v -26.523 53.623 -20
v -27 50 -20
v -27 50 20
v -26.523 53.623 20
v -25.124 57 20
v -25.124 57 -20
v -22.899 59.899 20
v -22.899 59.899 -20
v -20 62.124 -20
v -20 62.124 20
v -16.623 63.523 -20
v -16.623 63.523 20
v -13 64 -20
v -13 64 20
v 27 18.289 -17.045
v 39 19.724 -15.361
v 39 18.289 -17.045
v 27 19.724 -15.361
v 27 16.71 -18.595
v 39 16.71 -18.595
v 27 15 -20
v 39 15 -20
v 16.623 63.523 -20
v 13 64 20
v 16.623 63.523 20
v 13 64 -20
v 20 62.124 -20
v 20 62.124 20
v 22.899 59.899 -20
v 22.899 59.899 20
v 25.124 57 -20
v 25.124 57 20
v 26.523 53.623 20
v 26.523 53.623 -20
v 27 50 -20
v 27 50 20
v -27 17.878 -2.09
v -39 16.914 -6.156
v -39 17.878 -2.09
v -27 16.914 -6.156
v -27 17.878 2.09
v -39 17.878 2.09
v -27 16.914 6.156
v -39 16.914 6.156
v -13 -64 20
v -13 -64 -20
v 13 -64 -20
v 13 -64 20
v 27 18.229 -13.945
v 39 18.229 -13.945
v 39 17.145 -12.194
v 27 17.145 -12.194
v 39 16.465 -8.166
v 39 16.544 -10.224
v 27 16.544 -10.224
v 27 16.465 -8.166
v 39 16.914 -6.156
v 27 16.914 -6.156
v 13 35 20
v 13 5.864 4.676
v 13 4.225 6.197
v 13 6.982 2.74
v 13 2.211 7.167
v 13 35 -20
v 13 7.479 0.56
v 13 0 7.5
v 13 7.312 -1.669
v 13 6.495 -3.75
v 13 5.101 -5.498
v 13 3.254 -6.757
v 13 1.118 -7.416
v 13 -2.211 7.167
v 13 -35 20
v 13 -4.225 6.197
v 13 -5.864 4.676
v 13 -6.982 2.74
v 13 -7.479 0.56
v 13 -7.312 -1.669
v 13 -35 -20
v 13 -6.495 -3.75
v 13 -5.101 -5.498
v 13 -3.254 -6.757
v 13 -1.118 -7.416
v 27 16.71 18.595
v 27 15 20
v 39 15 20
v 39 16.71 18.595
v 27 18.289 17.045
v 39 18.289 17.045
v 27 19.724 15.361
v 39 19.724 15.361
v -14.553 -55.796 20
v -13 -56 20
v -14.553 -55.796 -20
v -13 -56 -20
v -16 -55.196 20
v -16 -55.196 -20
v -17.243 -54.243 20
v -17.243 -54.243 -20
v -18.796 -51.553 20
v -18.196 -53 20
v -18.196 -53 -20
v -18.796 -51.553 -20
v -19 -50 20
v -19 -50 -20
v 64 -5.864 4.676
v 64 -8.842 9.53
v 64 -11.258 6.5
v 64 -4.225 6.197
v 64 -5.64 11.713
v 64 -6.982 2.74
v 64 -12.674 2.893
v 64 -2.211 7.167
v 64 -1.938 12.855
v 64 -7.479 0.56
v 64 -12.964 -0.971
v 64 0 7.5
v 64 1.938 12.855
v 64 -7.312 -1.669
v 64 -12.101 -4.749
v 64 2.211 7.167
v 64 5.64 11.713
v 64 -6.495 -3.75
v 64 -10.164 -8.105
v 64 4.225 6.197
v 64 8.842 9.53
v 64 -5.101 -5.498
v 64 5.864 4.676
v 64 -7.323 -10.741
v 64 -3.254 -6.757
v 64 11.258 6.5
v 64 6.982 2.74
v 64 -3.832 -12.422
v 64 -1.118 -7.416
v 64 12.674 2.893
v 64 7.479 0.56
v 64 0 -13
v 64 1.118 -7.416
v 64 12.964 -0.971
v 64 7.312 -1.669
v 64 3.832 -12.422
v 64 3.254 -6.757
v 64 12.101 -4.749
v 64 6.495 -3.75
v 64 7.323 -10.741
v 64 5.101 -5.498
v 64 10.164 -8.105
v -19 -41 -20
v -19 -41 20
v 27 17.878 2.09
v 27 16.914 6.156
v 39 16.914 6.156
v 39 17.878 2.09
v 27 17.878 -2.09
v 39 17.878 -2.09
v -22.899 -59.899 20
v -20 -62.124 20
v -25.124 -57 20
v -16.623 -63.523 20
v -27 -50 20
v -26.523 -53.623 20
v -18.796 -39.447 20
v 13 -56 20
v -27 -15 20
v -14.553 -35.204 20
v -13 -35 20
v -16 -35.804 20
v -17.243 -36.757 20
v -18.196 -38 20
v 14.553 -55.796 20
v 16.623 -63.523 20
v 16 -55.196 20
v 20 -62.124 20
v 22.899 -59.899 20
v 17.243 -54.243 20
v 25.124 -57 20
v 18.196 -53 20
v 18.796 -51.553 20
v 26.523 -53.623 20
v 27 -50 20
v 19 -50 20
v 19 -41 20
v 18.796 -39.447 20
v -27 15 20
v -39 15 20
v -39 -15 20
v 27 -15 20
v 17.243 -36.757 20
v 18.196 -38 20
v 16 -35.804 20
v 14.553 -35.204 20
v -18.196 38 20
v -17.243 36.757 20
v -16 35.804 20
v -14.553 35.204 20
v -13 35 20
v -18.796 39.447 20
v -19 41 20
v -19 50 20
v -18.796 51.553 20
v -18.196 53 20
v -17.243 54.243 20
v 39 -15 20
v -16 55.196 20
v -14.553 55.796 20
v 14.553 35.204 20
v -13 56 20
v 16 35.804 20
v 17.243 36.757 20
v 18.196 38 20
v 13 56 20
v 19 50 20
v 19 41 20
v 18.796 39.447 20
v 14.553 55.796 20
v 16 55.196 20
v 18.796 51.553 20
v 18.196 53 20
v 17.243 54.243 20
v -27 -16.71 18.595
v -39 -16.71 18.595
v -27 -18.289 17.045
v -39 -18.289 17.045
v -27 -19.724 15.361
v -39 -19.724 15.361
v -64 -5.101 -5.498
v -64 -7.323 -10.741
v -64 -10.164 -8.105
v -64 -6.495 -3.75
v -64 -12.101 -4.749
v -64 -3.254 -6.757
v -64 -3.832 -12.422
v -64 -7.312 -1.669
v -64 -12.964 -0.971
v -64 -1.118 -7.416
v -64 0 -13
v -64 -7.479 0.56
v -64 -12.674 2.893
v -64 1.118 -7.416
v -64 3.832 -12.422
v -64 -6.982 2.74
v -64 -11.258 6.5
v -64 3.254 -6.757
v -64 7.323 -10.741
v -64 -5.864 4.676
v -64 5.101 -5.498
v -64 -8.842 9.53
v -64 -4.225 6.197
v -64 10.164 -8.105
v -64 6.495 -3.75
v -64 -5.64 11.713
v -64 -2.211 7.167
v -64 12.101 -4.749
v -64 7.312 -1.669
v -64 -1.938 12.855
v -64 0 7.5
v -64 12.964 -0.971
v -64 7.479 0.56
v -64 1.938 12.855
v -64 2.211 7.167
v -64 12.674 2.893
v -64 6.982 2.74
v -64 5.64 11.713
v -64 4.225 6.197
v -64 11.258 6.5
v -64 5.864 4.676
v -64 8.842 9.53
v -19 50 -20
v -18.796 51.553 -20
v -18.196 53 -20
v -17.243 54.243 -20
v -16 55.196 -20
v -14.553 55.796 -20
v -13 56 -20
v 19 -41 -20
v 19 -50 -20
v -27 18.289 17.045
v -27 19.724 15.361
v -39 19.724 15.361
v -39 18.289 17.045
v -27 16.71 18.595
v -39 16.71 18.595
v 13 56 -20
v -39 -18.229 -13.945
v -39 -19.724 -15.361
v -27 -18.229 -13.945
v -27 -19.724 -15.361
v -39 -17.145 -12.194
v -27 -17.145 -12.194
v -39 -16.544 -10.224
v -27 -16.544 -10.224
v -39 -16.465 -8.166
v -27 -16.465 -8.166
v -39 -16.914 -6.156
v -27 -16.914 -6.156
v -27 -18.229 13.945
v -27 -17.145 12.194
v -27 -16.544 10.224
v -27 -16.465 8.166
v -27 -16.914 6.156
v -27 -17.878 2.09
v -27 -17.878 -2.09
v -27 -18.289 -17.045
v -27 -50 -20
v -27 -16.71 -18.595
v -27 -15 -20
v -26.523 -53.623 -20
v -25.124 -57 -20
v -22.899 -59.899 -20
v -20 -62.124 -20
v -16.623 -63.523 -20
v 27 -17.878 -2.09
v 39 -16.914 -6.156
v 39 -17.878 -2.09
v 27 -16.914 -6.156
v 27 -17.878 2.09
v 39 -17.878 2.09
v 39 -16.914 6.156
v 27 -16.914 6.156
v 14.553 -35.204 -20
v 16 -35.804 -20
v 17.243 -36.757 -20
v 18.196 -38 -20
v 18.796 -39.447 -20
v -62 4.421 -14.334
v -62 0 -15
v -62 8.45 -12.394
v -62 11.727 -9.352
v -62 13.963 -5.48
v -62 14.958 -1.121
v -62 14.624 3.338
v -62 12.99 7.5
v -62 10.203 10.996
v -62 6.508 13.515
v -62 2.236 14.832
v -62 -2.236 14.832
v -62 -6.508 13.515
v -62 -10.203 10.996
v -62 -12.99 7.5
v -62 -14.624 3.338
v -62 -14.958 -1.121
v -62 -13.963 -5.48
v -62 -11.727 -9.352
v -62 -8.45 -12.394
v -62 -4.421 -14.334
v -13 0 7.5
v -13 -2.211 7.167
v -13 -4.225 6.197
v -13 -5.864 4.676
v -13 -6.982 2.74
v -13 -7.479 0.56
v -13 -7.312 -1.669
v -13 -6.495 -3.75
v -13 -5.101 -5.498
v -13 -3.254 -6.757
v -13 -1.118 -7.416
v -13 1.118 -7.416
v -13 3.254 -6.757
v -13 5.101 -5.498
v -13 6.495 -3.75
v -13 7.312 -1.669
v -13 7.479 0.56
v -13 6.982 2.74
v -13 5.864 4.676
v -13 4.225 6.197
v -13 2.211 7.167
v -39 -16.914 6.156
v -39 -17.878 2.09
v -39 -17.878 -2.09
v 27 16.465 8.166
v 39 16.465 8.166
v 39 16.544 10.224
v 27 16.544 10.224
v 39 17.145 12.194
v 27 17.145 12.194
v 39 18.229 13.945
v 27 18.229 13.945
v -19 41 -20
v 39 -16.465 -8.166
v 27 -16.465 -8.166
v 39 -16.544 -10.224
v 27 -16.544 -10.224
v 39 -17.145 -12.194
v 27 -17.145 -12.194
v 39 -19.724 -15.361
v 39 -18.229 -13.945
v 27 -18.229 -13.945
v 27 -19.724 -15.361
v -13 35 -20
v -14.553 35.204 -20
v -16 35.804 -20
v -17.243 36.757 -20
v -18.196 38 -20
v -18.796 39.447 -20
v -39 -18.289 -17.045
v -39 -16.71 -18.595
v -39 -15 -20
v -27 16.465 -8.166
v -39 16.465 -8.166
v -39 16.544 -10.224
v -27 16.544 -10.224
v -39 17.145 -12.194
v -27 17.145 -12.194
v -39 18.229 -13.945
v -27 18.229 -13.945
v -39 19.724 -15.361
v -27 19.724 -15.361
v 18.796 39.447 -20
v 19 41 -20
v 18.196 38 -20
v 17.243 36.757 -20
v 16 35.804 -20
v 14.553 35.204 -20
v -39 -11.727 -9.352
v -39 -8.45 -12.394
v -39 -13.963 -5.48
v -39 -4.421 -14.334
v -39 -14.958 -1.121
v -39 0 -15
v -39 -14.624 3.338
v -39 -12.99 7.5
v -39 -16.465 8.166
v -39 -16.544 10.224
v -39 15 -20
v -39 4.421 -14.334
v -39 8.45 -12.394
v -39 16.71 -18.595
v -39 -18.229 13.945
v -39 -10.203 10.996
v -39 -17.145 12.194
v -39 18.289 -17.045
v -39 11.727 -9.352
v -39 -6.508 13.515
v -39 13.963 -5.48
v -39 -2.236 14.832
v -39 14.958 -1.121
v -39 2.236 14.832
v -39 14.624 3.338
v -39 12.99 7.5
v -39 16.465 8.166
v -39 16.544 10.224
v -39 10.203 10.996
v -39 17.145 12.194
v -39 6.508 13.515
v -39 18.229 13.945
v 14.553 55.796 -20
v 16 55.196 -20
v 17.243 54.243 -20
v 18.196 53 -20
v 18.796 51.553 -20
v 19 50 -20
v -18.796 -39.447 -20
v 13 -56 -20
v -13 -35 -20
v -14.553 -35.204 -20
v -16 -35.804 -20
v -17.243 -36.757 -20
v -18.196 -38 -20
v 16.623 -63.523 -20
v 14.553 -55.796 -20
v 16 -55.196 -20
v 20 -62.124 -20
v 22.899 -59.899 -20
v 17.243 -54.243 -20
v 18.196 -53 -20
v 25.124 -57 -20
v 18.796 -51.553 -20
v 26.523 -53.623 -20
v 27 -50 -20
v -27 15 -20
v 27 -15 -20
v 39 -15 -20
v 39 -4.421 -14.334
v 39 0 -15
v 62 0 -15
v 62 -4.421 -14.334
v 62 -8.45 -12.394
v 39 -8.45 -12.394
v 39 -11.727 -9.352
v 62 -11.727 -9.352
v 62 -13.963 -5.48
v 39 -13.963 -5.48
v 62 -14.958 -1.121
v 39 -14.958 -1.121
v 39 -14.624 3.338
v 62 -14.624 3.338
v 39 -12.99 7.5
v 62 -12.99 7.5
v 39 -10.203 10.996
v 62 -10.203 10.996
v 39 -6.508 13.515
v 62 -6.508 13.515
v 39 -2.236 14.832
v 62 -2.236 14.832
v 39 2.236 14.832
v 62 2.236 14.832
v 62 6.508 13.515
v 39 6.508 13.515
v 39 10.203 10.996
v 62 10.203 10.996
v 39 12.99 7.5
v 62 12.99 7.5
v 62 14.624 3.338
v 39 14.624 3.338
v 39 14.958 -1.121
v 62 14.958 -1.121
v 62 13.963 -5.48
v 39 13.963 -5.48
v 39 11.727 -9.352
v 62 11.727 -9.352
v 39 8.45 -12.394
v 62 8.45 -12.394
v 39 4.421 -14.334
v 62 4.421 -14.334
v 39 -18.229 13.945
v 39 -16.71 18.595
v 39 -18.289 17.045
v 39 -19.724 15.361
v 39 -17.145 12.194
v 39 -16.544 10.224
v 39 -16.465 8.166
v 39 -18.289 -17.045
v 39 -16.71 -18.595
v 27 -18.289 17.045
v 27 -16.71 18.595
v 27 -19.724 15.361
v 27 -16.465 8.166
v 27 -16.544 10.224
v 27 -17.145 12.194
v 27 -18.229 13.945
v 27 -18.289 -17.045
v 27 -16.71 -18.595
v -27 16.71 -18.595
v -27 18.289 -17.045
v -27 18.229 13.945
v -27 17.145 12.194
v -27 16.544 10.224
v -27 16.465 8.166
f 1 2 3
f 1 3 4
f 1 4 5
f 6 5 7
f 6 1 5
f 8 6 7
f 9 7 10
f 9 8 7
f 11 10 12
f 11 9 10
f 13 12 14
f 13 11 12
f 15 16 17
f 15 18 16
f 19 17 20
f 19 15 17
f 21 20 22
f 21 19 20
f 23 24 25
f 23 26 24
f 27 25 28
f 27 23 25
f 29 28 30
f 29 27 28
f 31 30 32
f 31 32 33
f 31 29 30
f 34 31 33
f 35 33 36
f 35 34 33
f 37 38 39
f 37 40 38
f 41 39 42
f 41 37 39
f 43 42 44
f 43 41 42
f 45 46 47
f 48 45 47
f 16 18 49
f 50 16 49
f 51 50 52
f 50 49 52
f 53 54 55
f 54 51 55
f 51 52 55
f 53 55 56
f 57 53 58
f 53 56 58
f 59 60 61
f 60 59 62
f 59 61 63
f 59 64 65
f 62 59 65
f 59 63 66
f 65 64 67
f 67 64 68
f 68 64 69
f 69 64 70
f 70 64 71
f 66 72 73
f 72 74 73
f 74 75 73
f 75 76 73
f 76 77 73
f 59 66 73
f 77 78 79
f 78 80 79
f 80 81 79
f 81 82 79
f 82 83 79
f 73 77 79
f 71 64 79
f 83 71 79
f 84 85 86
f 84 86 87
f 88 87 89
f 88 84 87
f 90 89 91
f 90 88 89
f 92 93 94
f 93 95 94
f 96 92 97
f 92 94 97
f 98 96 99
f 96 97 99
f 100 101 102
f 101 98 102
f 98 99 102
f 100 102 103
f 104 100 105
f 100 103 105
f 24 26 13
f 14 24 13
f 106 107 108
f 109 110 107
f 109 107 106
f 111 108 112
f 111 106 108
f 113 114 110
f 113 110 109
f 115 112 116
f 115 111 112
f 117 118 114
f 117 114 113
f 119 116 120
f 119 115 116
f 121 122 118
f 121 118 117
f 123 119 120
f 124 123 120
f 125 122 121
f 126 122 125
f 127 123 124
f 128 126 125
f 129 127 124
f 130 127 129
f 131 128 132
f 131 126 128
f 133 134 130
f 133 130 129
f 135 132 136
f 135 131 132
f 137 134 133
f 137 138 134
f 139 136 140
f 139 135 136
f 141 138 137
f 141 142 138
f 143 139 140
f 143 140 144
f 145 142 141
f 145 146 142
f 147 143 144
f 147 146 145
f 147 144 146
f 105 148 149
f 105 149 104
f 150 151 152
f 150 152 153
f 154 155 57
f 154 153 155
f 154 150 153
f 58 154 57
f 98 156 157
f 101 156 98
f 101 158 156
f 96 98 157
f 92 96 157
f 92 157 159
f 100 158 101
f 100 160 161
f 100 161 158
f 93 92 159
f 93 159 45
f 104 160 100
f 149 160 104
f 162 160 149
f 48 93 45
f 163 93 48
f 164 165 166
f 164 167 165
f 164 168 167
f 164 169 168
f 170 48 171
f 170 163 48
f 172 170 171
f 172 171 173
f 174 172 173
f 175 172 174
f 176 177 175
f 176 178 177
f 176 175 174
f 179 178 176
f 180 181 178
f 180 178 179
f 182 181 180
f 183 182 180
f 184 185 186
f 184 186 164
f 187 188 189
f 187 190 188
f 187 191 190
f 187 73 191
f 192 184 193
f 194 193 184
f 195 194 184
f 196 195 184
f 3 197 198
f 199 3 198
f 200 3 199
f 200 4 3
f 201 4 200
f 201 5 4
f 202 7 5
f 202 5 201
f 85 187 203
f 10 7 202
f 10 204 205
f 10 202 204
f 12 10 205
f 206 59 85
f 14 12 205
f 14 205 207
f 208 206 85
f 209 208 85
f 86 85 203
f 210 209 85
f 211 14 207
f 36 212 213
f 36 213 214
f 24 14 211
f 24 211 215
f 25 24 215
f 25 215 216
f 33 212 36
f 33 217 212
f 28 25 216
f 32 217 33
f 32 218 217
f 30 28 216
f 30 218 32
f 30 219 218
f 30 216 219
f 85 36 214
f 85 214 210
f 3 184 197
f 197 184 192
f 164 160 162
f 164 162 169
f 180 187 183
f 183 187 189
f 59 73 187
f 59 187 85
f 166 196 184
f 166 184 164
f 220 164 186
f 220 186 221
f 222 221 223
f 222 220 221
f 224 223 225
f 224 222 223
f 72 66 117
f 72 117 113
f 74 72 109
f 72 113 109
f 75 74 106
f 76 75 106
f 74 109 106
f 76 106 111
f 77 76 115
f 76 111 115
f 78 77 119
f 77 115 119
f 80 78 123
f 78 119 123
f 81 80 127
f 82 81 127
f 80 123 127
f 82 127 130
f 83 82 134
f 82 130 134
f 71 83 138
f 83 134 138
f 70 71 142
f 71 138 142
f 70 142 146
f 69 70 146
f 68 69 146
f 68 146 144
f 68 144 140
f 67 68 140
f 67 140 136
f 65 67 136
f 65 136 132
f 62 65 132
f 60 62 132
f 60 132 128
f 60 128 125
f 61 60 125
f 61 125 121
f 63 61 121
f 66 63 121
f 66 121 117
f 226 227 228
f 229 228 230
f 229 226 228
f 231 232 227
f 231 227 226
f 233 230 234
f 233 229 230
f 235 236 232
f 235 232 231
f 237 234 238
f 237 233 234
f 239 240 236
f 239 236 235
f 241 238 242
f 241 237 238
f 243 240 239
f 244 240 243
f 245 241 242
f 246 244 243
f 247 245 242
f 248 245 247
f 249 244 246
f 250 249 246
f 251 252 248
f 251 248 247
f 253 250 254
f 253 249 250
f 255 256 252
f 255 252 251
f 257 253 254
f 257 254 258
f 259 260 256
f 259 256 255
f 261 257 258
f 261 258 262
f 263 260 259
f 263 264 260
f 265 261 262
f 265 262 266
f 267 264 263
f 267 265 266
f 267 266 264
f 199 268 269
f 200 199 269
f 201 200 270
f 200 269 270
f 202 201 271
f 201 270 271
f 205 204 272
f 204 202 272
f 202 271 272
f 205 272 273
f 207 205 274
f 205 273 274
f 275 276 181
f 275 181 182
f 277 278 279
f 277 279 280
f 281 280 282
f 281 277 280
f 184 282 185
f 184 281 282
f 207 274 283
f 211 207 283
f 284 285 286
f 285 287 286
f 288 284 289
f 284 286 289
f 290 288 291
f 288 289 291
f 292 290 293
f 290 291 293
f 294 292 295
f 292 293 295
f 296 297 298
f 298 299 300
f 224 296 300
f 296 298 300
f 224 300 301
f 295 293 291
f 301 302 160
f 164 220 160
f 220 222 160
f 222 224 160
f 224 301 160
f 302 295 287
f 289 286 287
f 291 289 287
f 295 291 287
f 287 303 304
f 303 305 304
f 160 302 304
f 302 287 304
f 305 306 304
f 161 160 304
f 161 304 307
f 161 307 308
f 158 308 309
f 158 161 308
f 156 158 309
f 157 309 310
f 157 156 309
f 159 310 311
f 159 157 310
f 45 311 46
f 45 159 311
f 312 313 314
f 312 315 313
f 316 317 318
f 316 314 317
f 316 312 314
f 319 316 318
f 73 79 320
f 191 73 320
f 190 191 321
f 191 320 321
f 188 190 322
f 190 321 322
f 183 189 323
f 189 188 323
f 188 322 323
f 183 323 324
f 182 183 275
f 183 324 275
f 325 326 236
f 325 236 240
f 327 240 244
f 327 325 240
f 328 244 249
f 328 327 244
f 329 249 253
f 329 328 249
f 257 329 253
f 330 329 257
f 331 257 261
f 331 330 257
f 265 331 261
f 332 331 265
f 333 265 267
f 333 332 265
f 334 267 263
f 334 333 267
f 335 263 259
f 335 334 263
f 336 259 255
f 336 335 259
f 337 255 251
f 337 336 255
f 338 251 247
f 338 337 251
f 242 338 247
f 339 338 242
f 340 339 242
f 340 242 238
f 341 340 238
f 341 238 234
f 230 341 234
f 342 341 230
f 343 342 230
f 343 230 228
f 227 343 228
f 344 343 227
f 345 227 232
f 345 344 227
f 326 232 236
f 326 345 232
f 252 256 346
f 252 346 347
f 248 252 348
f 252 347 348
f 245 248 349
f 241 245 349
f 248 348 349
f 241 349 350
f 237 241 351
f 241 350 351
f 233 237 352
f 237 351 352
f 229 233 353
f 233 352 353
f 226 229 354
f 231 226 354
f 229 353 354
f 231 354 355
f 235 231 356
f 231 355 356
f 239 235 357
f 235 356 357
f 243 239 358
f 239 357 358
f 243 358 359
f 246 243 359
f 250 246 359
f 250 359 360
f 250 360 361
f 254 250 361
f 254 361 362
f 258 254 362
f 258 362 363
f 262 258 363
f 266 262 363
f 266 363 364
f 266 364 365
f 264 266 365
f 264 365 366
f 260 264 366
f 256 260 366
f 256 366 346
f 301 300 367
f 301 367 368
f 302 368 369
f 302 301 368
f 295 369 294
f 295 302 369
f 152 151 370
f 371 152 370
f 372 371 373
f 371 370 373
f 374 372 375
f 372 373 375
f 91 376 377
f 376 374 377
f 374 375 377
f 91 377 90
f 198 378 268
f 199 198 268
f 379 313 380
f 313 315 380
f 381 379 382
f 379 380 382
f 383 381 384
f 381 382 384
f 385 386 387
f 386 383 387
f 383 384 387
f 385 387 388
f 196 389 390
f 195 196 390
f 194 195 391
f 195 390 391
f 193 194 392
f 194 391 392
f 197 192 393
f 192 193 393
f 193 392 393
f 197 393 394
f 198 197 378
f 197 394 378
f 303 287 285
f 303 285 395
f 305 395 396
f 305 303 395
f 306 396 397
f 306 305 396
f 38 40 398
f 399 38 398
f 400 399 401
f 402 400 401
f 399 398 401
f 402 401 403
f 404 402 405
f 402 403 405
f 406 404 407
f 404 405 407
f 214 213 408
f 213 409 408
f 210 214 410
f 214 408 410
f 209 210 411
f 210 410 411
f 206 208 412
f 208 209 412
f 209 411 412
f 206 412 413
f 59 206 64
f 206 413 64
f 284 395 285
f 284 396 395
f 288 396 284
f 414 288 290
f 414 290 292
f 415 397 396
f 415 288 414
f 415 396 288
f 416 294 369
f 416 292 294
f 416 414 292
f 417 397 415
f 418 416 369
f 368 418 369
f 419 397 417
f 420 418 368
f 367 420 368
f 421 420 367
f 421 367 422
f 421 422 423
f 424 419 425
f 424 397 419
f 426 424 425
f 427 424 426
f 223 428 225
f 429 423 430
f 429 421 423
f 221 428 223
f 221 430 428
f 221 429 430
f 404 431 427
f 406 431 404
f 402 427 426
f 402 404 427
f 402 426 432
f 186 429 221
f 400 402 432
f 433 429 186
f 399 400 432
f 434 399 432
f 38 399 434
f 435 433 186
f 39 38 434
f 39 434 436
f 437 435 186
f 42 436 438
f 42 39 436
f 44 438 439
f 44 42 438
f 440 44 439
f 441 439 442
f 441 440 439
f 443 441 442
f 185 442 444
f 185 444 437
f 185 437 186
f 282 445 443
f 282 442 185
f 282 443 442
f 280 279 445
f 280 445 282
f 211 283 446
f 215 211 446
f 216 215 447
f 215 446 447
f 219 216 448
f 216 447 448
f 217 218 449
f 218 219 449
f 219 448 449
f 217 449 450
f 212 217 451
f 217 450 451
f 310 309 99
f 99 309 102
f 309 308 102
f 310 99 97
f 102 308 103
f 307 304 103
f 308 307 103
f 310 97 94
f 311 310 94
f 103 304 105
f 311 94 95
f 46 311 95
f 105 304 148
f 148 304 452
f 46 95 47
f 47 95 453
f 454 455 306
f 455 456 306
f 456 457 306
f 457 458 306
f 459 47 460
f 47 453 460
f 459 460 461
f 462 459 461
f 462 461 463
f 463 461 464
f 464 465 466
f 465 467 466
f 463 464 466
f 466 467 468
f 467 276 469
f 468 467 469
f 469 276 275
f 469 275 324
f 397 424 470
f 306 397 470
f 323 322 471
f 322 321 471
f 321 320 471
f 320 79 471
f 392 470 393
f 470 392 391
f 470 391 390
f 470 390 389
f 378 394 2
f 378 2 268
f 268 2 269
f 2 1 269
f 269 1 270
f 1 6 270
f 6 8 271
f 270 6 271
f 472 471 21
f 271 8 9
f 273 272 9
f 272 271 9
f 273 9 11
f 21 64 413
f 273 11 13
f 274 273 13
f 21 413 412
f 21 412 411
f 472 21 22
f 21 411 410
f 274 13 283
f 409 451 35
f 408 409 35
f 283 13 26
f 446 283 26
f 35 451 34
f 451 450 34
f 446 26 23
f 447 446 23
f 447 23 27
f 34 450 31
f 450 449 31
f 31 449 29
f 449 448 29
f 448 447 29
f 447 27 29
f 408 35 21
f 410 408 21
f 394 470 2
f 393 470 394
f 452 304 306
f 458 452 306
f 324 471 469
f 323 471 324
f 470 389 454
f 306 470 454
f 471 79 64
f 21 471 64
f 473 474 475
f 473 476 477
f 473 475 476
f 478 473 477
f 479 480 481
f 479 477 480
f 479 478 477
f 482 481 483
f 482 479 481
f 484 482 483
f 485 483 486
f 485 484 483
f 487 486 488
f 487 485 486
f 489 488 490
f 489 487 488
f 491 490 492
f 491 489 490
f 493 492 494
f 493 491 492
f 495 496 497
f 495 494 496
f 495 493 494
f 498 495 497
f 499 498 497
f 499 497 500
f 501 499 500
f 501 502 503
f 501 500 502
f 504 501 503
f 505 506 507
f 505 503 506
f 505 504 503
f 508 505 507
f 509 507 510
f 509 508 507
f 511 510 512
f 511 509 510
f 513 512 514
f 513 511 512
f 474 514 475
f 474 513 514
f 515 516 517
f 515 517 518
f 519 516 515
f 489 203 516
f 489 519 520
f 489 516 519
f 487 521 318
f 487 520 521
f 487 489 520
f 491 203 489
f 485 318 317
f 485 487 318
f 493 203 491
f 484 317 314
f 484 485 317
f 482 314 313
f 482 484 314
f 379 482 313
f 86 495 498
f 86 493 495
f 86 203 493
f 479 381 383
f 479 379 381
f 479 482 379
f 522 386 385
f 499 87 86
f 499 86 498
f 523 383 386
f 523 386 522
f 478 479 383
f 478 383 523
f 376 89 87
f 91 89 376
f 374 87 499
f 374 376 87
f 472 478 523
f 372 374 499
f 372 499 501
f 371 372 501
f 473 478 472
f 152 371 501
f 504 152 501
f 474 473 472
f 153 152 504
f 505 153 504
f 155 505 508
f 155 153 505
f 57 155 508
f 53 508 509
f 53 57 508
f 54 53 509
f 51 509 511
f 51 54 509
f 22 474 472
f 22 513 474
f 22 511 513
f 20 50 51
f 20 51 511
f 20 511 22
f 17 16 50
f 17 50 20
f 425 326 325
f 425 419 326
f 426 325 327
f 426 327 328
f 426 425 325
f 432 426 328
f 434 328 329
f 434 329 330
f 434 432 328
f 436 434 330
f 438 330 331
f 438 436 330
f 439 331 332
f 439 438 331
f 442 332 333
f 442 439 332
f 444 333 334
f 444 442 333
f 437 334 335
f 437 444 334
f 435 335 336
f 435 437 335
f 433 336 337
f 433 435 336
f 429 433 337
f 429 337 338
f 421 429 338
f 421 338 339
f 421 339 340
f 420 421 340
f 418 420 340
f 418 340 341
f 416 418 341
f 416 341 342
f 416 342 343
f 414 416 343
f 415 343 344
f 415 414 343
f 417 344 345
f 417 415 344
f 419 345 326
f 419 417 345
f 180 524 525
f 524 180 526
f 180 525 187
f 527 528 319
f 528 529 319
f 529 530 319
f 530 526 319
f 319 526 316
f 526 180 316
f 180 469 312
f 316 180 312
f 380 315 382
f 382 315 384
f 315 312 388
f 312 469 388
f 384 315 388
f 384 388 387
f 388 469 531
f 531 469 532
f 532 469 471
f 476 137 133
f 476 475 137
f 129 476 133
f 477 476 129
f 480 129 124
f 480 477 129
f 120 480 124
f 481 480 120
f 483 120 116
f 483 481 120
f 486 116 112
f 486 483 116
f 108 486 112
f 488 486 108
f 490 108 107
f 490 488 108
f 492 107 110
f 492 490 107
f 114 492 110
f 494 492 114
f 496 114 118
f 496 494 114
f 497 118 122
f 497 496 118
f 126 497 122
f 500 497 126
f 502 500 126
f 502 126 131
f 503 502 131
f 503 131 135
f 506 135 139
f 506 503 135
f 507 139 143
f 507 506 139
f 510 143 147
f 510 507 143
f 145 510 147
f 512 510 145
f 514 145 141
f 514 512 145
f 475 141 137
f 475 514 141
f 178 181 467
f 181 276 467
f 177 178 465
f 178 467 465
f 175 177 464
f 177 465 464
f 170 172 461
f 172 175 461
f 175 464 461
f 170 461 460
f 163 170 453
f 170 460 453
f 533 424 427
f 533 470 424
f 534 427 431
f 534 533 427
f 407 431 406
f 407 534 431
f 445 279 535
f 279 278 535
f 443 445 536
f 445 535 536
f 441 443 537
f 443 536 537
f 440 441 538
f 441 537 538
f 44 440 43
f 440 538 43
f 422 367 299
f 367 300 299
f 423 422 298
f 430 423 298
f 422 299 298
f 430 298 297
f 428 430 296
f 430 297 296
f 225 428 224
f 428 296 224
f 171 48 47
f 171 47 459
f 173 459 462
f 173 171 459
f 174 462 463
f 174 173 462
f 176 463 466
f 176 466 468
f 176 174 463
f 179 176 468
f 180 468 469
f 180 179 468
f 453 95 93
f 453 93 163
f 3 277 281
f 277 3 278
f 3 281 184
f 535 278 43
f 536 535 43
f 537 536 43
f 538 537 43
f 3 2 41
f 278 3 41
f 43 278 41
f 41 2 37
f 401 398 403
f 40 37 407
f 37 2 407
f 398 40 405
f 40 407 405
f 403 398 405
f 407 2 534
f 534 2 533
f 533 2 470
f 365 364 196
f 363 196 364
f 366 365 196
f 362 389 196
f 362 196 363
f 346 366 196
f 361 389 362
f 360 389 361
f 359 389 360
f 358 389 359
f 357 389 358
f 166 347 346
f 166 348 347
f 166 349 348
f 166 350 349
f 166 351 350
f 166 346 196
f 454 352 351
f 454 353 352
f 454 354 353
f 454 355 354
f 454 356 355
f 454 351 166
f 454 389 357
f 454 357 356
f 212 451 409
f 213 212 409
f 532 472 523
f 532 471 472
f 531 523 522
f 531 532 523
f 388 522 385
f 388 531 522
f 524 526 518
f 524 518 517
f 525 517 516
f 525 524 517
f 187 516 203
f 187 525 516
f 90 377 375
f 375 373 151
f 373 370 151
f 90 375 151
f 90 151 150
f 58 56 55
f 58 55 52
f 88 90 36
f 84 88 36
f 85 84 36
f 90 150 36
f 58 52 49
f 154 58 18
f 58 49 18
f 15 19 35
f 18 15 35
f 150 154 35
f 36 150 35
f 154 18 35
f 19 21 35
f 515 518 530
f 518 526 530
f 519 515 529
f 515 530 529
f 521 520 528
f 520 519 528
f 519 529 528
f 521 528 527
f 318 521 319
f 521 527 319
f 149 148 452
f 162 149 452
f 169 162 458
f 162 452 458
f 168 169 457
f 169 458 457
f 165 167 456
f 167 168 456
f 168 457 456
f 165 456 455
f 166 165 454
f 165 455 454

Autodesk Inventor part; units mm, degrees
ref_plane "YZ Plane" through (0, 0, 0) normal (1, 0, 0) x (0, 1, 0)
ref_plane "XZ Plane" through (0, 0, 0) normal (0, 1, 0) x (-1, 0, 0)
ref_plane "XY Plane" through (0, 0, 0) normal (0, 0, 1) x (1, 0, 0)
sketch "Sketch1" plane through (0, 0, 0) normal (0, 0, 1) x (1, 0, 0)
  line L0 (-27, -64) -> (27, -64)
  line L1 (27, -64) -> (27, 64)
  line L2 (27, 64) -> (-27, 64)
  line L3 (-27, 64) -> (-27, -64)
  line L4 (-27, -64) -> (27, 64) construction
  line L5 (27, -64) -> (-27, 64) construction
  line L6 (-13, 56) -> (13, 56)
  line L7 (19, 50) -> (19, 41)
  line L8 (13, 35) -> (13, 35)
  line L9 (-19, 41) -> (-19, 50)
  arc A0 (-13, 56) -> (-19, 50) centre (-13, 50) ccw
  arc A1 (19, 50) -> (13, 56) centre (13, 50) ccw
  arc A2 (13, 35) -> (19, 41) centre (13, 41) ccw
  arc A3 (-19, 41) -> (-13, 35) centre (-13, 41) ccw
  line L10 (-37.8, 0) -> (37.8, 0) construction
  line L11 (-27, 64) -> (27, -64) construction
  line L12 (-13, -56) -> (13, -56)
  line L13 (19, -50) -> (19, -41)
  line L14 (13, -35) -> (13, -35)
  line L15 (-19, -41) -> (-19, -50)
  arc A4 (-19, -50) -> (-13, -56) centre (-13, -50) ccw
  arc A5 (13, -56) -> (19, -50) centre (13, -50) ccw
  arc A6 (19, -41) -> (13, -35) centre (13, -41) ccw
  arc A7 (-13, -35) -> (-19, -41) centre (-13, -41) ccw
  line L16 (-13, 35) -> (-13, -35)
  line L17 (13, 35) -> (13, -35)
  line L18 (0, -89.6) -> (0, 89.6) construction
  line L19 (-13, 35) -> (-13, 35)
  line L20 (13, 35) -> (-13, 35) construction
  line L21 (-13, -35) -> (-13, -35)
  line L22 (13, -35) -> (-13, -35) construction
  point P0 (0, 0)
  point P1 (0, 56)
  point P2 (0, 0)
  point P3 (13, 35)
  point P4 (13, -35)
  point P5 (-13, -35)
  point P6 (-13, 35)
  dimension "d0" = 54
  dimension "d1" = 128
  dimension "d2" = 38
  dimension "d3" = 6
  dimension "d4" = 35
  dimension "d5" = 8
  dimension "d6" = 26
extrude "Extrusion1" add sketch "Sketch1" along normal mid plane 40
fillet "Fillet1" radius 14 4 edges at (27, -64, 0) (-27, -64, 0) (-27, 64, 0) (27, 64, 0)
sketch "Sketch2" plane through (27, -50, 20) normal (1, 0, 0) x (0, 0, -1)
  line L0 (0, 0) -> (0, 100) projected
  line L1 (40, 100) -> (40, 0) projected
  arc A0 (0, 35) -> (4.6393, 30.2757) centre (20, 50) ccw
  arc A1 (0, 65) -> (0, 35) centre (20, 50) ccw construction
  arc A2 (40, 65) -> (35.3607, 69.7243) centre (20, 50) ccw
  arc A3 (40, 35) -> (40, 65) centre (20, 50) ccw construction
  line L2 (0, 65) -> (0, 35)
  line L3 (0, 15) -> (0, 85) projected
  line L4 (40, 85) -> (40, 15) projected
  line L5 (40, 65) -> (40, 35)
  circle A4 centre (20, 50) radius 18 construction
  line L6 (11.1075, 74.432) -> (20, 50) construction
  line L7 (28.8925, 74.432) -> (20, 50) construction
  line L8 (20, -39.6) -> (20, 139.6) construction
  line L9 (11.1075, 74.432) -> (28.8925, 74.432) construction
  arc A5 (26.1564, 66.9145) -> (13.8436, 66.9145) centre (20, 50) ccw
  arc A6 (4.6393, 69.7243) -> (13.8436, 66.9145) centre (11.1075, 74.432) ccw
  arc A7 (19.1075, 74.432) -> (19.0885, 74.9834) centre (11.1075, 74.432) ccw construction
  arc A8 (20.9115, 74.9834) -> (20.8925, 74.432) centre (28.8925, 74.432) ccw construction
  arc A9 (26.1564, 66.9145) -> (35.3607, 69.7243) centre (28.8925, 74.432) ccw
  arc A10 (4.6393, 69.7243) -> (0, 65) centre (20, 50) ccw
  arc A11 (35.3607, 69.7243) -> (4.6393, 69.7243) centre (20, 50) ccw construction
  line L10 (55, 50) -> (-15, 50) construction
  circle A12 centre (20, 50) radius 18 construction
  line L11 (11.1075, 25.568) -> (20, 50) construction
  line L12 (28.8925, 25.568) -> (20, 50) construction
  line L13 (20, 139.6) -> (20, -39.6) construction
  arc A13 (13.8436, 33.0855) -> (26.1564, 33.0855) centre (20, 50) ccw
  arc A14 (13.8436, 33.0855) -> (4.6393, 30.2757) centre (11.1075, 25.568) ccw
  arc A15 (35.3607, 30.2757) -> (26.1564, 33.0855) centre (28.8925, 25.568) ccw
  arc A16 (4.6393, 30.2757) -> (35.3607, 30.2757) centre (20, 50) ccw construction
  arc A17 (35.3607, 30.2757) -> (40, 35) centre (20, 50) ccw
  point P0 (20, 74.432)
  dimension "d10" = 50
  dimension "d11" = 36
  dimension "d15" = 40
extrude "Extrusion2" add sketch "Sketch2" along normal blind 12
sketch "Sketch3" plane through (39, -50, 20) normal (1, 0, 0) x (0, 0, -1)
  arc A0 (40, 65) -> (35.3607, 69.7243) centre (20, 50) ccw projected
  circle A1 centre (20, 50) radius 15
  dimension "d18" = 30
extrude "Extrusion3" add sketch "Sketch3" along normal blind 25
chamfer "Chamfer1" distance 2 angle 45 1 edges at (64, 0, 15)
mirror "Mirror1" about plane through (0, 0, 0) normal (1, 0, 0) of "Extrusion2", "Extrusion3", "Chamfer1"
sketch "Sketch4" plane through (-64, 0, 0) normal (-1, 0, 0) x (0, 0, 1)
  circle A0 centre (0, 0) radius 13 projected
  point P0 (0, 0)
hole "Hole1" at (-64, 0, 0) direction (1, 0, 0) diameter 15 end through all
properties part number "Part036.Connecting cross" material "Steel, Carbon"
